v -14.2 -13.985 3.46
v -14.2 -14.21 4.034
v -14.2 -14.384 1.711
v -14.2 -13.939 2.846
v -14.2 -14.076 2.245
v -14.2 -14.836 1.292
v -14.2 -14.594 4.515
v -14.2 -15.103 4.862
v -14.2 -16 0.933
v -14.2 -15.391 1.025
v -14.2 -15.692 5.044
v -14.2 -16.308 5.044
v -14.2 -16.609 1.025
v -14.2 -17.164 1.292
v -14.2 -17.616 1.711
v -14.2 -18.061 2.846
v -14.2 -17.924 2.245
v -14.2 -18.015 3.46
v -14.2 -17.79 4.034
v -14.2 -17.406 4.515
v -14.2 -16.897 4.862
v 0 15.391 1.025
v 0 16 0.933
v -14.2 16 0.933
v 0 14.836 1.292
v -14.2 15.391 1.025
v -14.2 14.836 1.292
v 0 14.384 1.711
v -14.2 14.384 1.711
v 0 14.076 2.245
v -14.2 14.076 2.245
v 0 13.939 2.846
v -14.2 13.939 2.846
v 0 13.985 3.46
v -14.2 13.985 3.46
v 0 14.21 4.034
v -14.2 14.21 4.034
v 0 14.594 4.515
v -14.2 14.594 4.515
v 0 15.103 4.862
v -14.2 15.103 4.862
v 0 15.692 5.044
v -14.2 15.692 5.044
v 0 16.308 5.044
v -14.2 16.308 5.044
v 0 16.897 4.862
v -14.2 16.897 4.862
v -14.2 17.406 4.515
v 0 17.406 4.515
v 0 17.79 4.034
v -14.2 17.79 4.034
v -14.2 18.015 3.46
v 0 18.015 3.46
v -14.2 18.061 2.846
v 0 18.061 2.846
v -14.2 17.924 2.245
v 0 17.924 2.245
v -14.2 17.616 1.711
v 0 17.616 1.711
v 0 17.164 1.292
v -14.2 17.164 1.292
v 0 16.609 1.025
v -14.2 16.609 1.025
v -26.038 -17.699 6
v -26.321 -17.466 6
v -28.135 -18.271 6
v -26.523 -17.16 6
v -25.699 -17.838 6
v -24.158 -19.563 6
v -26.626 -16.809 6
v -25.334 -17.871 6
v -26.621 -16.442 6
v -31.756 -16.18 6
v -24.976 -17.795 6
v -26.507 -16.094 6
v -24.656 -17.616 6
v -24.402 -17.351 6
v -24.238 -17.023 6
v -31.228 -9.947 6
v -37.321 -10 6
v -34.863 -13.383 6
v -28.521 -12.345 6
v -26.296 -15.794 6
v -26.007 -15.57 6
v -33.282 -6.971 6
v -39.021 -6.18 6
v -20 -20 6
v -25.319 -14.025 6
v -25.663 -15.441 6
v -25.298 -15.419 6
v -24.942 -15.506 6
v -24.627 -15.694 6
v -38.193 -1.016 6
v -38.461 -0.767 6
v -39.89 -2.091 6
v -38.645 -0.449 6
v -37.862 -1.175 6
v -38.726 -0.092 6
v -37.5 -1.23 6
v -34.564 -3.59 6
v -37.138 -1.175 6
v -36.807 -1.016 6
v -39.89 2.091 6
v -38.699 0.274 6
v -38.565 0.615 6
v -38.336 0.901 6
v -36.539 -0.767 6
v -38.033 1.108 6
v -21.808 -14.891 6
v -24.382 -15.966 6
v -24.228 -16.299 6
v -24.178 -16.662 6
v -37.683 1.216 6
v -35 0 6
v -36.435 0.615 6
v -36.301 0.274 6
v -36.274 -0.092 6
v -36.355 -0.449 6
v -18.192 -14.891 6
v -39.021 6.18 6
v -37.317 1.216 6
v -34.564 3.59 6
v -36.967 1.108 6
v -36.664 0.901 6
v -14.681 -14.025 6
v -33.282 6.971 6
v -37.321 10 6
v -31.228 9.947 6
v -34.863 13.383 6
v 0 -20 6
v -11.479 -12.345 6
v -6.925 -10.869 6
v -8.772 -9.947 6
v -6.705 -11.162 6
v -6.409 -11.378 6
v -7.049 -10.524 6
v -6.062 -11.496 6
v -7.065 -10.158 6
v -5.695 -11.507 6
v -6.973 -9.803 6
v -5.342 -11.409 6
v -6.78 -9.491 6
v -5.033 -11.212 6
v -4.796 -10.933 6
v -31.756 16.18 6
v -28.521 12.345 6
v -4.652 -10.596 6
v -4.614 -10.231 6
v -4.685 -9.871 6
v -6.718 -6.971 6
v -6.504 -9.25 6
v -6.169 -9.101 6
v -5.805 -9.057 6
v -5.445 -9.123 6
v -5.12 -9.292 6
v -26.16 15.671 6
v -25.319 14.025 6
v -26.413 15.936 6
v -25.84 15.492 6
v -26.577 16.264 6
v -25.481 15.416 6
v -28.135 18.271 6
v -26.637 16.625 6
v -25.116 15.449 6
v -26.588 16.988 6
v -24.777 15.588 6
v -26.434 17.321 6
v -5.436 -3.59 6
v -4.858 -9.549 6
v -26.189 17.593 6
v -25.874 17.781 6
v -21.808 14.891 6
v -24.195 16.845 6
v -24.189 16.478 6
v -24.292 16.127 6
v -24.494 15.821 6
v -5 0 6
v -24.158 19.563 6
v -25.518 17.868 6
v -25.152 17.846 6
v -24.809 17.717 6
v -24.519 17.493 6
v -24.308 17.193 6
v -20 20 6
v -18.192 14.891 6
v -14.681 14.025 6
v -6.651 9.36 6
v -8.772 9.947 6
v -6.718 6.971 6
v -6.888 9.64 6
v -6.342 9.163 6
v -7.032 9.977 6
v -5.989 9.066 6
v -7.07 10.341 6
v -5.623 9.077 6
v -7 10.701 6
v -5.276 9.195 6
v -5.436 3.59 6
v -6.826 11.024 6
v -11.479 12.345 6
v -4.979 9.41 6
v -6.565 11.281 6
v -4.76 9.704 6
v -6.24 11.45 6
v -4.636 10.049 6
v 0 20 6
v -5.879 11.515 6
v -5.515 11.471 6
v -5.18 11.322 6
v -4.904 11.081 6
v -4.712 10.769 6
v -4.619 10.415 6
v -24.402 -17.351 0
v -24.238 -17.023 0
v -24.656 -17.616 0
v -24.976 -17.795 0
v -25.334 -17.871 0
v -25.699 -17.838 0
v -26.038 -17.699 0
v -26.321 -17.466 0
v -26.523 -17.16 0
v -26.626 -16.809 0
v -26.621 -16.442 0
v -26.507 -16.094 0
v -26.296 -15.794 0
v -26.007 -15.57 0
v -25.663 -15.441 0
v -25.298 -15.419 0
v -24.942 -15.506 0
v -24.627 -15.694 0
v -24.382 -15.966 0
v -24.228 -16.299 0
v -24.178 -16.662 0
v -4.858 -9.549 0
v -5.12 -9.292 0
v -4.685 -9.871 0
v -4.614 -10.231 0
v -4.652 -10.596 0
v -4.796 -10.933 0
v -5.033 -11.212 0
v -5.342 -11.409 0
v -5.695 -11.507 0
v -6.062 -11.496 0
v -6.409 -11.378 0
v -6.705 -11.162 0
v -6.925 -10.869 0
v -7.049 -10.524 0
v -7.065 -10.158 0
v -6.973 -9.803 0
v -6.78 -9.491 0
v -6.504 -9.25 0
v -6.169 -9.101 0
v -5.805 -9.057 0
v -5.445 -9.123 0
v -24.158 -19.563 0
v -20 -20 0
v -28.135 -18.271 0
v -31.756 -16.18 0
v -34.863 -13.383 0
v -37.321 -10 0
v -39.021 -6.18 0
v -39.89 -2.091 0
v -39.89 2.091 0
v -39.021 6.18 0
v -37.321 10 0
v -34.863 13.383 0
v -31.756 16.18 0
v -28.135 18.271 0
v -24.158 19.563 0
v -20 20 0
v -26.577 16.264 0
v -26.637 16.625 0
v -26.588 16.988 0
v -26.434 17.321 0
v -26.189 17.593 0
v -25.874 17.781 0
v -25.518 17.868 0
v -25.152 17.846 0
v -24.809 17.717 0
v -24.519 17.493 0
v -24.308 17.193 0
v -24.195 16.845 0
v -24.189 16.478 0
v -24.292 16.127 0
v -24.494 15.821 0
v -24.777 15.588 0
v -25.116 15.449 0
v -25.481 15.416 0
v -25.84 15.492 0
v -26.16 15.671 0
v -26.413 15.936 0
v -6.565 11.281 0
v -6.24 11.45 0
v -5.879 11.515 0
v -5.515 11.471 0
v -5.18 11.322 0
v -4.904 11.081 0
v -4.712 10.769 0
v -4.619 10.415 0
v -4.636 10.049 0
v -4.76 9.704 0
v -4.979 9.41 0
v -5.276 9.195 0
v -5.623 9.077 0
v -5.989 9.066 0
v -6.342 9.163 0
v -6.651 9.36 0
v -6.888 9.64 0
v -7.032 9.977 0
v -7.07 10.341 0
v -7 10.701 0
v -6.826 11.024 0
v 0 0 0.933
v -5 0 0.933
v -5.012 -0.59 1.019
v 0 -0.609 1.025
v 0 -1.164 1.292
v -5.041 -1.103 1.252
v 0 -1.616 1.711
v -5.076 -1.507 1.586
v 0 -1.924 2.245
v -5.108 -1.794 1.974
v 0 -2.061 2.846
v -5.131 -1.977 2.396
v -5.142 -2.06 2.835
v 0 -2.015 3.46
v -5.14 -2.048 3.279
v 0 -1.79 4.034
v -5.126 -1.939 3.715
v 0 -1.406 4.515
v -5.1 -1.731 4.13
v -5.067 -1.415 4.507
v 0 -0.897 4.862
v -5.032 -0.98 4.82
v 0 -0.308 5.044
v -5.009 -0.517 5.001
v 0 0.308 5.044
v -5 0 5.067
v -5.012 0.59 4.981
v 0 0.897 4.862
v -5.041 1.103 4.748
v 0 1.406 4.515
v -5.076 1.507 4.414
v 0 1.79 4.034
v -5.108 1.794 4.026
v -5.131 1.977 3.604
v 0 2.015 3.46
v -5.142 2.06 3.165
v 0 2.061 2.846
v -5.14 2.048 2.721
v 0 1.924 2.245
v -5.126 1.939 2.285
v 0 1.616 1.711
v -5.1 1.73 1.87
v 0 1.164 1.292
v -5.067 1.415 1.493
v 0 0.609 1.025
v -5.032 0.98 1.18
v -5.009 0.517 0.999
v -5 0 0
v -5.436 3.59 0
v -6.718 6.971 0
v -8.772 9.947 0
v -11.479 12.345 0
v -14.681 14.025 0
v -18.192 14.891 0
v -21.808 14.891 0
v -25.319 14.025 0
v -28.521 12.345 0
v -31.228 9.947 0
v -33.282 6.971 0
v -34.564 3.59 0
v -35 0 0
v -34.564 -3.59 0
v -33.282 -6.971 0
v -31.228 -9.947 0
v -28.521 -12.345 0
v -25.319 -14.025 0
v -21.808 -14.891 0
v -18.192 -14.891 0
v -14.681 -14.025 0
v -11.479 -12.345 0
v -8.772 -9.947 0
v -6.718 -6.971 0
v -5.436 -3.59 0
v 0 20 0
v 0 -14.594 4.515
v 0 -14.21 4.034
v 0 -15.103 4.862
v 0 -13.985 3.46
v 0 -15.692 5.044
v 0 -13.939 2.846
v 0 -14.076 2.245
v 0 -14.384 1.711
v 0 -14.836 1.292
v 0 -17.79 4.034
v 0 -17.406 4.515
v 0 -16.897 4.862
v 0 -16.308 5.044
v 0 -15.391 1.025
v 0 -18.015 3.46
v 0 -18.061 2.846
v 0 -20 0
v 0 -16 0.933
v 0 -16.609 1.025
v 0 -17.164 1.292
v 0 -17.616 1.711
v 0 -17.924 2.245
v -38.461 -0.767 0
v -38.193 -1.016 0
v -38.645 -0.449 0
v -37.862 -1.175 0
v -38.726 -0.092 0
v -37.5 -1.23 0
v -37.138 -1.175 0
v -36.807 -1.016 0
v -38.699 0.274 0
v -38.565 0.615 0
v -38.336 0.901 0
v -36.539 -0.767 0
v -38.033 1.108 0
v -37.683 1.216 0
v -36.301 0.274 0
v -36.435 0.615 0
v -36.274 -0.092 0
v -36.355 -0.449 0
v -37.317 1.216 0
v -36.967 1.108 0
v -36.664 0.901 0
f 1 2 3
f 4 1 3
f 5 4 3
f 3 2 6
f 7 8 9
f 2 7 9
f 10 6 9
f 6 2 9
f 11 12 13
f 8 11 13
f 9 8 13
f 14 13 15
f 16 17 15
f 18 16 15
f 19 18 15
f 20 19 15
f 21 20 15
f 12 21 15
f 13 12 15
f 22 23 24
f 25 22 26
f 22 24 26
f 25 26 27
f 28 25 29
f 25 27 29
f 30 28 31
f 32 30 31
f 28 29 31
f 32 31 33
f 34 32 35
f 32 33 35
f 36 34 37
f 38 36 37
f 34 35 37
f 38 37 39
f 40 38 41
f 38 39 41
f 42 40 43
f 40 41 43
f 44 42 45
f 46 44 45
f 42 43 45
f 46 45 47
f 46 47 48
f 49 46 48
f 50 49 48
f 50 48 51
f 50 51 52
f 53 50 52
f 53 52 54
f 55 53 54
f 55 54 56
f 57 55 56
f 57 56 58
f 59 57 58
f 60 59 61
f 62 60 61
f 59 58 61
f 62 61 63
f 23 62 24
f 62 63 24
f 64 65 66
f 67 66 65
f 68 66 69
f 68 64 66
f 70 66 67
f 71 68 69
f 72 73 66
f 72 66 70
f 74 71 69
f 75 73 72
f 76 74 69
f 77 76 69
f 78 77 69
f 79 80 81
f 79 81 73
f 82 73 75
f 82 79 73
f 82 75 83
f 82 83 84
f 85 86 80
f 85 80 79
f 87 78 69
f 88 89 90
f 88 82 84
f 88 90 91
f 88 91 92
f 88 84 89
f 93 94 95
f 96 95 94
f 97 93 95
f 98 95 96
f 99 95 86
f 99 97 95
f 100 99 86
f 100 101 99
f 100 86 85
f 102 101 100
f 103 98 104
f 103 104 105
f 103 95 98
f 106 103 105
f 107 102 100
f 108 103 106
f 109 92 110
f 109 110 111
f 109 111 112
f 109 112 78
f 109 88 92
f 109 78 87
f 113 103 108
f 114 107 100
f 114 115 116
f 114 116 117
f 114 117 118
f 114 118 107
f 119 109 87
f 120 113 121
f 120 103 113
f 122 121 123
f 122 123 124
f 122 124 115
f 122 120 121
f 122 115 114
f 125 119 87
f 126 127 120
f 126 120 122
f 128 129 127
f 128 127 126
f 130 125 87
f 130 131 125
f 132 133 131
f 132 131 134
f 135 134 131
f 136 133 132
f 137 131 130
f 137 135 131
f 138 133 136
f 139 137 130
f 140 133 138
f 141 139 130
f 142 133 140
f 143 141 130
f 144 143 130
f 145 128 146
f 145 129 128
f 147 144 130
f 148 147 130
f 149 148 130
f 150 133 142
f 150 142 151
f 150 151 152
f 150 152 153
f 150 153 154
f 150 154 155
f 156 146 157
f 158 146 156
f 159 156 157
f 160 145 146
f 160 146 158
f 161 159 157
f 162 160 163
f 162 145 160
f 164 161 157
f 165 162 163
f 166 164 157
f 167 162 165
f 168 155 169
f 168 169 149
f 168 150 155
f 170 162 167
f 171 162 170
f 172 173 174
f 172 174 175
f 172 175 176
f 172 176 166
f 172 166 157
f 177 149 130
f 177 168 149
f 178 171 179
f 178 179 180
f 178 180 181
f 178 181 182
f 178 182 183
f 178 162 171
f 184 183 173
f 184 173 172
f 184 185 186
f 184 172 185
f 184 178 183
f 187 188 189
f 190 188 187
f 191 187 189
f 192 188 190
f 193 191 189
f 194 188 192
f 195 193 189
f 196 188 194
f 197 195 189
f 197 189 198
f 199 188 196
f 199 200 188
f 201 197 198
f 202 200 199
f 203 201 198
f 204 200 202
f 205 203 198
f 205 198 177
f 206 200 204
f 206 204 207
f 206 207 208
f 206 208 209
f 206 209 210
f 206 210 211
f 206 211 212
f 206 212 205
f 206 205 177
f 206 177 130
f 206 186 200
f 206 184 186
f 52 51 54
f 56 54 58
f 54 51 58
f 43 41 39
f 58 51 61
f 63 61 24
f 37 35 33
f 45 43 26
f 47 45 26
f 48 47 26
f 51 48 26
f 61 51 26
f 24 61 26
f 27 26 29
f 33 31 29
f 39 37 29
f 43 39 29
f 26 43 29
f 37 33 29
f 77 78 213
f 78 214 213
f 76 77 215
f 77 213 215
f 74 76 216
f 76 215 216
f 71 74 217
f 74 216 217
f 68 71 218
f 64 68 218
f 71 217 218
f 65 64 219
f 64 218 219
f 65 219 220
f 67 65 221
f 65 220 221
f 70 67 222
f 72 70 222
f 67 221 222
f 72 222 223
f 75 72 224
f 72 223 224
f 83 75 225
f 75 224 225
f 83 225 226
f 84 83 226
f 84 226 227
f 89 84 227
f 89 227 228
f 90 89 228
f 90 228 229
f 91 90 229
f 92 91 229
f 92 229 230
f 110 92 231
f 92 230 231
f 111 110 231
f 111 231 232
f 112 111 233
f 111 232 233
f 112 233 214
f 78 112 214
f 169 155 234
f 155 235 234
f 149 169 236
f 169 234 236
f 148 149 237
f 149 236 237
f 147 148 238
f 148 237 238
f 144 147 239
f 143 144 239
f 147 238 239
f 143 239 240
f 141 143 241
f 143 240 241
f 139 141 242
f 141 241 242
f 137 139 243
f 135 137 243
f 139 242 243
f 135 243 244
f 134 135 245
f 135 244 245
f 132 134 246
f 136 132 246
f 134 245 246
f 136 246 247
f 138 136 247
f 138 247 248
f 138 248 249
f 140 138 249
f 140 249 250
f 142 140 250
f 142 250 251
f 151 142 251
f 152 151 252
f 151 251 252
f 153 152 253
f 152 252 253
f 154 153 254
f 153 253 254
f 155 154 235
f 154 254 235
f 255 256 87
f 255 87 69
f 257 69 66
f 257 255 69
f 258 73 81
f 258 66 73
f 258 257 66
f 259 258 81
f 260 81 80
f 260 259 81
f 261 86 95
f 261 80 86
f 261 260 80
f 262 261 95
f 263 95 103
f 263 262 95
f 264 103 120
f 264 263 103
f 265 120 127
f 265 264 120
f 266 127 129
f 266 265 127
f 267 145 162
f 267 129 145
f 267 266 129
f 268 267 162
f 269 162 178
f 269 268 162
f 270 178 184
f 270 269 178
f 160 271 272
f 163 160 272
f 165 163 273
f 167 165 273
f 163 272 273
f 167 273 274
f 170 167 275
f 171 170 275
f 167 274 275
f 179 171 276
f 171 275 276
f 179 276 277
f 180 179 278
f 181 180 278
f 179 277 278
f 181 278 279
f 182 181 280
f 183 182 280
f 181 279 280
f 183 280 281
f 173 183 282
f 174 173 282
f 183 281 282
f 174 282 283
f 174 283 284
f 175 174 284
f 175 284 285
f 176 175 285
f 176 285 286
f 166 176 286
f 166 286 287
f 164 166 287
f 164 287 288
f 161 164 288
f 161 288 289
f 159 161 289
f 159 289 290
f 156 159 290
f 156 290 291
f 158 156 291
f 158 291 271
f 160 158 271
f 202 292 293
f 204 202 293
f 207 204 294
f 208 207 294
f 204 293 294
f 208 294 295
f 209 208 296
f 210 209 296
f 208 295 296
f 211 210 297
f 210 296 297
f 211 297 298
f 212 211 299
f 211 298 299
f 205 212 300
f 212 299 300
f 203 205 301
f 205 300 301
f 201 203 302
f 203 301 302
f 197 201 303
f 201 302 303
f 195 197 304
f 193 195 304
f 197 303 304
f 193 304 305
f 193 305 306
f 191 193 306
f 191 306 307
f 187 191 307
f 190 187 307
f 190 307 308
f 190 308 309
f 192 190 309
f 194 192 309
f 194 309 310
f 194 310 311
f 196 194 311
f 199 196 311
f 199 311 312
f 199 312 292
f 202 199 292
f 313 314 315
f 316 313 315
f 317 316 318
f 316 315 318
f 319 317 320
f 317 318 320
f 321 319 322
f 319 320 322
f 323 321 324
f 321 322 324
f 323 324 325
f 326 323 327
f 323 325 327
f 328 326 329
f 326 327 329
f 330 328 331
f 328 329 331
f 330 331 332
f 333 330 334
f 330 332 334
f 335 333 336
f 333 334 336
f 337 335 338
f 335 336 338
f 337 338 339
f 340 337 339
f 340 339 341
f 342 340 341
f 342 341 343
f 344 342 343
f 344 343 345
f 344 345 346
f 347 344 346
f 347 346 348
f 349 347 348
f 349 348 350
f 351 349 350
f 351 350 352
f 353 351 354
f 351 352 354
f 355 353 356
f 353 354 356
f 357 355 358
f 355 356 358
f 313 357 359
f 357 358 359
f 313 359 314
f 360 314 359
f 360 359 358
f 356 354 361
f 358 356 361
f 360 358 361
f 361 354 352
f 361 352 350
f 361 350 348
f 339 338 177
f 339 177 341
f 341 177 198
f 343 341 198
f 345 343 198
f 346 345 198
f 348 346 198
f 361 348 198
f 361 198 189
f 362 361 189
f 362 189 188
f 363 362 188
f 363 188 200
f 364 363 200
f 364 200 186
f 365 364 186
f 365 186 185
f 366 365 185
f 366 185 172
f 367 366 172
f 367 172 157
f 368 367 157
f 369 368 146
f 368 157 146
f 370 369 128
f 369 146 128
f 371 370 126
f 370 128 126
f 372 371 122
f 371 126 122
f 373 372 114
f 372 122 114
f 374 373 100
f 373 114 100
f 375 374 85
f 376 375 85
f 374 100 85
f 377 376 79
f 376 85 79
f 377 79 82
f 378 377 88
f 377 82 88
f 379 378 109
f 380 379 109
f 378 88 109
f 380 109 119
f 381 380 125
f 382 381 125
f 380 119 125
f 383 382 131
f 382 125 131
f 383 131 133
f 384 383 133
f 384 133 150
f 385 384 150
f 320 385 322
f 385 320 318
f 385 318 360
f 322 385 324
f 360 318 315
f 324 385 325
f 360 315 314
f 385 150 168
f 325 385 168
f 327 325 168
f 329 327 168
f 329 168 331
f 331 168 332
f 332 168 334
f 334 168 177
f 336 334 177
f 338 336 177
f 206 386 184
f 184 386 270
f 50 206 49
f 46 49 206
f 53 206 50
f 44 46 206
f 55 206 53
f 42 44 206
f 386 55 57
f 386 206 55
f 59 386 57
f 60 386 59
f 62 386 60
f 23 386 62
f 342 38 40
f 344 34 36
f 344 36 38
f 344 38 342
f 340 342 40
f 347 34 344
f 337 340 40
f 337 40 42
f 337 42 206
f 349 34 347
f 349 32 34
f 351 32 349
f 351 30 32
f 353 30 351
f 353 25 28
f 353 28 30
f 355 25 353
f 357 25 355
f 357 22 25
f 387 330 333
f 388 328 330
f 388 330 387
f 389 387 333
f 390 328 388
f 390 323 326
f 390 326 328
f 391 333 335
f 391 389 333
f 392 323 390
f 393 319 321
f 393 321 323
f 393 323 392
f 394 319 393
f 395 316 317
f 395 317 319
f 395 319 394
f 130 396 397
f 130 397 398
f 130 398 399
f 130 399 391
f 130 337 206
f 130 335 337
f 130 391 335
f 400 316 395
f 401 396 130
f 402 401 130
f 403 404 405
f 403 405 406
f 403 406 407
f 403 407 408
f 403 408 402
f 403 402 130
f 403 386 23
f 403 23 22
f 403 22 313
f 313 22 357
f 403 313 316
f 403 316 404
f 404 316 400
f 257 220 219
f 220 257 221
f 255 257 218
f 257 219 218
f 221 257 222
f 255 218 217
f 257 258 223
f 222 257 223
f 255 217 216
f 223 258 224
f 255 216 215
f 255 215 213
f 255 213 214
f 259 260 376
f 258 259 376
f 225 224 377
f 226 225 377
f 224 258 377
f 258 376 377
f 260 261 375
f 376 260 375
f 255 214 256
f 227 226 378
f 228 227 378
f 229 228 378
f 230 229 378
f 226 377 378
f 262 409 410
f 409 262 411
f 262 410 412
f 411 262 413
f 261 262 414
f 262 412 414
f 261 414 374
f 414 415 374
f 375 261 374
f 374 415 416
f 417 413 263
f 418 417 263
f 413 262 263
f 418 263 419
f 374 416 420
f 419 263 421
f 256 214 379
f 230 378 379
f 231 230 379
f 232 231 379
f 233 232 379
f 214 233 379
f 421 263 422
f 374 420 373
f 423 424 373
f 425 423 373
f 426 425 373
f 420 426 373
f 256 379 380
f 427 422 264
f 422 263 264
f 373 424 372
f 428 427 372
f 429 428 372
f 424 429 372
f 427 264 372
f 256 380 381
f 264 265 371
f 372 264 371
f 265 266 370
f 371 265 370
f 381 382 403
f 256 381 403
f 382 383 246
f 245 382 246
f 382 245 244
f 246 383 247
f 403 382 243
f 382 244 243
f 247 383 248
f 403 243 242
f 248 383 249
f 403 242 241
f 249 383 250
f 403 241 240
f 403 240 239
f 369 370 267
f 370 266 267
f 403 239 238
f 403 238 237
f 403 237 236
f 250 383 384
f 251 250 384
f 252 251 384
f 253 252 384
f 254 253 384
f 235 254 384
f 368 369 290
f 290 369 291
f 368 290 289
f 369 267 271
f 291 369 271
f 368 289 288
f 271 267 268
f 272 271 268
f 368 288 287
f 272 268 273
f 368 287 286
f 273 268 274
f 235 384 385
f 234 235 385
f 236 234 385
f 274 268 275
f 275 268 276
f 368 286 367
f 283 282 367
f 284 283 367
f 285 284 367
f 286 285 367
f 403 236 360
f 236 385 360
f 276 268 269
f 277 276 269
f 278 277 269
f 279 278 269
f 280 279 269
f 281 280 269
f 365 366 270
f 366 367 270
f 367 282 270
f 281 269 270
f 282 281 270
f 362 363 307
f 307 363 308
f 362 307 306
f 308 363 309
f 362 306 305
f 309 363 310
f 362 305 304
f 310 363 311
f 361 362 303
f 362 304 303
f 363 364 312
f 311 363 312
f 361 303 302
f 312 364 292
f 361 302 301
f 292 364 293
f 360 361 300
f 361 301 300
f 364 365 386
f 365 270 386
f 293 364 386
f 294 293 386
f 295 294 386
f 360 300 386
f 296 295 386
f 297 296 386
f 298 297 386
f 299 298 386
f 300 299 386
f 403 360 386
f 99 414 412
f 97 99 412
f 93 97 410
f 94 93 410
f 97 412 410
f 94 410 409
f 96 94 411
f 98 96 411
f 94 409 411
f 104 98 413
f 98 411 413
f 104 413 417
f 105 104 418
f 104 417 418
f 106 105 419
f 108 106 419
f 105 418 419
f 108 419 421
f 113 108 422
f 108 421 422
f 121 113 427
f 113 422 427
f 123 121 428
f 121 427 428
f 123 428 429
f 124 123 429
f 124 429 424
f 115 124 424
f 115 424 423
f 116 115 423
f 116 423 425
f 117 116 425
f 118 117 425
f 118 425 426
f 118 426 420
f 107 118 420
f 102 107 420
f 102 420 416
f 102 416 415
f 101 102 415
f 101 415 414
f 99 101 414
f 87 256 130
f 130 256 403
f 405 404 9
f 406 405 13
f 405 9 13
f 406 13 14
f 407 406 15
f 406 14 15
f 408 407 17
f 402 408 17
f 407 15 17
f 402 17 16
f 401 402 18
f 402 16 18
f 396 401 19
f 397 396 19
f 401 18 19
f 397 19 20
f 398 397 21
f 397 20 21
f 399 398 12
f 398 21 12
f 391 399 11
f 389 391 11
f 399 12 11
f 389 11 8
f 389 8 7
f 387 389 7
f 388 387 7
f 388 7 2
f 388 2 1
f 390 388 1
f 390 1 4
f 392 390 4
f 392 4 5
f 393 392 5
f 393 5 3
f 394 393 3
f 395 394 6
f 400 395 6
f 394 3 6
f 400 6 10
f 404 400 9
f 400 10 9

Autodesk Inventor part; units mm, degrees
ref_plane "YZ Plane" through (0, 0, 0) normal (1, 0, 0) x (0, 1, 0)
ref_plane "XZ Plane" through (0, 0, 0) normal (0, 1, 0) x (-1, 0, 0)
ref_plane "XY Plane" through (0, 0, 0) normal (0, 0, 1) x (1, 0, 0)
sketch "Sketch1" plane through (0, 0, 0) normal (0, 0, 1) x (1, 0, 0)
  line L0 (0, 20) -> (0, -20)
  line L1 (0, 20) -> (-20, 20)
  arc A0 (-20, 20) -> (-20, -20) centre (-20, 0) ccw
  line L2 (-20, -20) -> (0, -20)
  point P0 (0, 0)
  point P1 (0, 0)
  dimension "d0" = 20
  dimension "d1" = 20
extrude "Extrusion1" add sketch "Sketch1" along normal blind 6
sketch "Sketch2" plane through (0, 0, 6) normal (0, 0, 1) x (1, 0, 0)
  circle A0 centre (-20, 0) radius 17.5 construction
  line L0 (0, -20) -> (0, 20) projected
  point P0 (0, 0)
  point P1 (0, 0)
  point P2 (-37.5, 0)
  point P3 (0, 0)
  dimension "d5" = 35
  dimension "d4" = 20
hole "Hole1" at (-37.5, 0, 6) direction (0, 0, -1) diameter 2.459 depth 6 thread size "M3x0.5" class "6H" standard "ISO Metric profile"
pattern_circular "Circular Pattern1" count 5 over 360 about axis through (-20, 0, 0) along (0, 0, 1) of "Hole1"
sketch "Sketch4" plane through (0, -20, 0) normal (1, 0, 0) x (0, 0, -1)
  line L0 (0, 0) -> (0, 40) projected
  line L1 (0, 40) -> (-6, 40) projected
  point P0 (0, 20)
  point P1 (-3, 36)
  point P2 (-3, 20)
  point P3 (-3, 4)
  point P4 (0, 20)
  point P5 (-3, 40)
  dimension "d16" = 32
  dimension "d17" = 16
hole "Hole2" at (0, 16, 3) at (0, -16, 3) direction (-1, 0, 0) diameter 4.134 depth 14.2 thread size "M5x0.8" class "6H" standard "ISO Metric profile"
hole "Hole3" at (0, 0, 3) direction (-1, 0, 0) diameter 4.134 depth 14.2 thread size "M5x0.8" class "6H" standard "ISO Metric profile"
sketch "Sketch5" plane through (0, 0, 6) normal (0, 0, 1) x (1, 0, 0)
  circle A0 centre (-20, 0) radius 15
  line L0 (0, -20) -> (0, 20) projected
  arc A1 (-20, 20) -> (-20, -20) centre (-20, 0) ccw projected
  point P0 (0, 0)
  point P1 (0, 0)
  point P2 (0, 0)
  dimension "d32" = 30
extrude "Extrusion2" cut sketch "Sketch5" against normal up to surface (6 mm away)
equation "\"d17\" = 0.5 * d16"
properties part number "34" material "Gold"
